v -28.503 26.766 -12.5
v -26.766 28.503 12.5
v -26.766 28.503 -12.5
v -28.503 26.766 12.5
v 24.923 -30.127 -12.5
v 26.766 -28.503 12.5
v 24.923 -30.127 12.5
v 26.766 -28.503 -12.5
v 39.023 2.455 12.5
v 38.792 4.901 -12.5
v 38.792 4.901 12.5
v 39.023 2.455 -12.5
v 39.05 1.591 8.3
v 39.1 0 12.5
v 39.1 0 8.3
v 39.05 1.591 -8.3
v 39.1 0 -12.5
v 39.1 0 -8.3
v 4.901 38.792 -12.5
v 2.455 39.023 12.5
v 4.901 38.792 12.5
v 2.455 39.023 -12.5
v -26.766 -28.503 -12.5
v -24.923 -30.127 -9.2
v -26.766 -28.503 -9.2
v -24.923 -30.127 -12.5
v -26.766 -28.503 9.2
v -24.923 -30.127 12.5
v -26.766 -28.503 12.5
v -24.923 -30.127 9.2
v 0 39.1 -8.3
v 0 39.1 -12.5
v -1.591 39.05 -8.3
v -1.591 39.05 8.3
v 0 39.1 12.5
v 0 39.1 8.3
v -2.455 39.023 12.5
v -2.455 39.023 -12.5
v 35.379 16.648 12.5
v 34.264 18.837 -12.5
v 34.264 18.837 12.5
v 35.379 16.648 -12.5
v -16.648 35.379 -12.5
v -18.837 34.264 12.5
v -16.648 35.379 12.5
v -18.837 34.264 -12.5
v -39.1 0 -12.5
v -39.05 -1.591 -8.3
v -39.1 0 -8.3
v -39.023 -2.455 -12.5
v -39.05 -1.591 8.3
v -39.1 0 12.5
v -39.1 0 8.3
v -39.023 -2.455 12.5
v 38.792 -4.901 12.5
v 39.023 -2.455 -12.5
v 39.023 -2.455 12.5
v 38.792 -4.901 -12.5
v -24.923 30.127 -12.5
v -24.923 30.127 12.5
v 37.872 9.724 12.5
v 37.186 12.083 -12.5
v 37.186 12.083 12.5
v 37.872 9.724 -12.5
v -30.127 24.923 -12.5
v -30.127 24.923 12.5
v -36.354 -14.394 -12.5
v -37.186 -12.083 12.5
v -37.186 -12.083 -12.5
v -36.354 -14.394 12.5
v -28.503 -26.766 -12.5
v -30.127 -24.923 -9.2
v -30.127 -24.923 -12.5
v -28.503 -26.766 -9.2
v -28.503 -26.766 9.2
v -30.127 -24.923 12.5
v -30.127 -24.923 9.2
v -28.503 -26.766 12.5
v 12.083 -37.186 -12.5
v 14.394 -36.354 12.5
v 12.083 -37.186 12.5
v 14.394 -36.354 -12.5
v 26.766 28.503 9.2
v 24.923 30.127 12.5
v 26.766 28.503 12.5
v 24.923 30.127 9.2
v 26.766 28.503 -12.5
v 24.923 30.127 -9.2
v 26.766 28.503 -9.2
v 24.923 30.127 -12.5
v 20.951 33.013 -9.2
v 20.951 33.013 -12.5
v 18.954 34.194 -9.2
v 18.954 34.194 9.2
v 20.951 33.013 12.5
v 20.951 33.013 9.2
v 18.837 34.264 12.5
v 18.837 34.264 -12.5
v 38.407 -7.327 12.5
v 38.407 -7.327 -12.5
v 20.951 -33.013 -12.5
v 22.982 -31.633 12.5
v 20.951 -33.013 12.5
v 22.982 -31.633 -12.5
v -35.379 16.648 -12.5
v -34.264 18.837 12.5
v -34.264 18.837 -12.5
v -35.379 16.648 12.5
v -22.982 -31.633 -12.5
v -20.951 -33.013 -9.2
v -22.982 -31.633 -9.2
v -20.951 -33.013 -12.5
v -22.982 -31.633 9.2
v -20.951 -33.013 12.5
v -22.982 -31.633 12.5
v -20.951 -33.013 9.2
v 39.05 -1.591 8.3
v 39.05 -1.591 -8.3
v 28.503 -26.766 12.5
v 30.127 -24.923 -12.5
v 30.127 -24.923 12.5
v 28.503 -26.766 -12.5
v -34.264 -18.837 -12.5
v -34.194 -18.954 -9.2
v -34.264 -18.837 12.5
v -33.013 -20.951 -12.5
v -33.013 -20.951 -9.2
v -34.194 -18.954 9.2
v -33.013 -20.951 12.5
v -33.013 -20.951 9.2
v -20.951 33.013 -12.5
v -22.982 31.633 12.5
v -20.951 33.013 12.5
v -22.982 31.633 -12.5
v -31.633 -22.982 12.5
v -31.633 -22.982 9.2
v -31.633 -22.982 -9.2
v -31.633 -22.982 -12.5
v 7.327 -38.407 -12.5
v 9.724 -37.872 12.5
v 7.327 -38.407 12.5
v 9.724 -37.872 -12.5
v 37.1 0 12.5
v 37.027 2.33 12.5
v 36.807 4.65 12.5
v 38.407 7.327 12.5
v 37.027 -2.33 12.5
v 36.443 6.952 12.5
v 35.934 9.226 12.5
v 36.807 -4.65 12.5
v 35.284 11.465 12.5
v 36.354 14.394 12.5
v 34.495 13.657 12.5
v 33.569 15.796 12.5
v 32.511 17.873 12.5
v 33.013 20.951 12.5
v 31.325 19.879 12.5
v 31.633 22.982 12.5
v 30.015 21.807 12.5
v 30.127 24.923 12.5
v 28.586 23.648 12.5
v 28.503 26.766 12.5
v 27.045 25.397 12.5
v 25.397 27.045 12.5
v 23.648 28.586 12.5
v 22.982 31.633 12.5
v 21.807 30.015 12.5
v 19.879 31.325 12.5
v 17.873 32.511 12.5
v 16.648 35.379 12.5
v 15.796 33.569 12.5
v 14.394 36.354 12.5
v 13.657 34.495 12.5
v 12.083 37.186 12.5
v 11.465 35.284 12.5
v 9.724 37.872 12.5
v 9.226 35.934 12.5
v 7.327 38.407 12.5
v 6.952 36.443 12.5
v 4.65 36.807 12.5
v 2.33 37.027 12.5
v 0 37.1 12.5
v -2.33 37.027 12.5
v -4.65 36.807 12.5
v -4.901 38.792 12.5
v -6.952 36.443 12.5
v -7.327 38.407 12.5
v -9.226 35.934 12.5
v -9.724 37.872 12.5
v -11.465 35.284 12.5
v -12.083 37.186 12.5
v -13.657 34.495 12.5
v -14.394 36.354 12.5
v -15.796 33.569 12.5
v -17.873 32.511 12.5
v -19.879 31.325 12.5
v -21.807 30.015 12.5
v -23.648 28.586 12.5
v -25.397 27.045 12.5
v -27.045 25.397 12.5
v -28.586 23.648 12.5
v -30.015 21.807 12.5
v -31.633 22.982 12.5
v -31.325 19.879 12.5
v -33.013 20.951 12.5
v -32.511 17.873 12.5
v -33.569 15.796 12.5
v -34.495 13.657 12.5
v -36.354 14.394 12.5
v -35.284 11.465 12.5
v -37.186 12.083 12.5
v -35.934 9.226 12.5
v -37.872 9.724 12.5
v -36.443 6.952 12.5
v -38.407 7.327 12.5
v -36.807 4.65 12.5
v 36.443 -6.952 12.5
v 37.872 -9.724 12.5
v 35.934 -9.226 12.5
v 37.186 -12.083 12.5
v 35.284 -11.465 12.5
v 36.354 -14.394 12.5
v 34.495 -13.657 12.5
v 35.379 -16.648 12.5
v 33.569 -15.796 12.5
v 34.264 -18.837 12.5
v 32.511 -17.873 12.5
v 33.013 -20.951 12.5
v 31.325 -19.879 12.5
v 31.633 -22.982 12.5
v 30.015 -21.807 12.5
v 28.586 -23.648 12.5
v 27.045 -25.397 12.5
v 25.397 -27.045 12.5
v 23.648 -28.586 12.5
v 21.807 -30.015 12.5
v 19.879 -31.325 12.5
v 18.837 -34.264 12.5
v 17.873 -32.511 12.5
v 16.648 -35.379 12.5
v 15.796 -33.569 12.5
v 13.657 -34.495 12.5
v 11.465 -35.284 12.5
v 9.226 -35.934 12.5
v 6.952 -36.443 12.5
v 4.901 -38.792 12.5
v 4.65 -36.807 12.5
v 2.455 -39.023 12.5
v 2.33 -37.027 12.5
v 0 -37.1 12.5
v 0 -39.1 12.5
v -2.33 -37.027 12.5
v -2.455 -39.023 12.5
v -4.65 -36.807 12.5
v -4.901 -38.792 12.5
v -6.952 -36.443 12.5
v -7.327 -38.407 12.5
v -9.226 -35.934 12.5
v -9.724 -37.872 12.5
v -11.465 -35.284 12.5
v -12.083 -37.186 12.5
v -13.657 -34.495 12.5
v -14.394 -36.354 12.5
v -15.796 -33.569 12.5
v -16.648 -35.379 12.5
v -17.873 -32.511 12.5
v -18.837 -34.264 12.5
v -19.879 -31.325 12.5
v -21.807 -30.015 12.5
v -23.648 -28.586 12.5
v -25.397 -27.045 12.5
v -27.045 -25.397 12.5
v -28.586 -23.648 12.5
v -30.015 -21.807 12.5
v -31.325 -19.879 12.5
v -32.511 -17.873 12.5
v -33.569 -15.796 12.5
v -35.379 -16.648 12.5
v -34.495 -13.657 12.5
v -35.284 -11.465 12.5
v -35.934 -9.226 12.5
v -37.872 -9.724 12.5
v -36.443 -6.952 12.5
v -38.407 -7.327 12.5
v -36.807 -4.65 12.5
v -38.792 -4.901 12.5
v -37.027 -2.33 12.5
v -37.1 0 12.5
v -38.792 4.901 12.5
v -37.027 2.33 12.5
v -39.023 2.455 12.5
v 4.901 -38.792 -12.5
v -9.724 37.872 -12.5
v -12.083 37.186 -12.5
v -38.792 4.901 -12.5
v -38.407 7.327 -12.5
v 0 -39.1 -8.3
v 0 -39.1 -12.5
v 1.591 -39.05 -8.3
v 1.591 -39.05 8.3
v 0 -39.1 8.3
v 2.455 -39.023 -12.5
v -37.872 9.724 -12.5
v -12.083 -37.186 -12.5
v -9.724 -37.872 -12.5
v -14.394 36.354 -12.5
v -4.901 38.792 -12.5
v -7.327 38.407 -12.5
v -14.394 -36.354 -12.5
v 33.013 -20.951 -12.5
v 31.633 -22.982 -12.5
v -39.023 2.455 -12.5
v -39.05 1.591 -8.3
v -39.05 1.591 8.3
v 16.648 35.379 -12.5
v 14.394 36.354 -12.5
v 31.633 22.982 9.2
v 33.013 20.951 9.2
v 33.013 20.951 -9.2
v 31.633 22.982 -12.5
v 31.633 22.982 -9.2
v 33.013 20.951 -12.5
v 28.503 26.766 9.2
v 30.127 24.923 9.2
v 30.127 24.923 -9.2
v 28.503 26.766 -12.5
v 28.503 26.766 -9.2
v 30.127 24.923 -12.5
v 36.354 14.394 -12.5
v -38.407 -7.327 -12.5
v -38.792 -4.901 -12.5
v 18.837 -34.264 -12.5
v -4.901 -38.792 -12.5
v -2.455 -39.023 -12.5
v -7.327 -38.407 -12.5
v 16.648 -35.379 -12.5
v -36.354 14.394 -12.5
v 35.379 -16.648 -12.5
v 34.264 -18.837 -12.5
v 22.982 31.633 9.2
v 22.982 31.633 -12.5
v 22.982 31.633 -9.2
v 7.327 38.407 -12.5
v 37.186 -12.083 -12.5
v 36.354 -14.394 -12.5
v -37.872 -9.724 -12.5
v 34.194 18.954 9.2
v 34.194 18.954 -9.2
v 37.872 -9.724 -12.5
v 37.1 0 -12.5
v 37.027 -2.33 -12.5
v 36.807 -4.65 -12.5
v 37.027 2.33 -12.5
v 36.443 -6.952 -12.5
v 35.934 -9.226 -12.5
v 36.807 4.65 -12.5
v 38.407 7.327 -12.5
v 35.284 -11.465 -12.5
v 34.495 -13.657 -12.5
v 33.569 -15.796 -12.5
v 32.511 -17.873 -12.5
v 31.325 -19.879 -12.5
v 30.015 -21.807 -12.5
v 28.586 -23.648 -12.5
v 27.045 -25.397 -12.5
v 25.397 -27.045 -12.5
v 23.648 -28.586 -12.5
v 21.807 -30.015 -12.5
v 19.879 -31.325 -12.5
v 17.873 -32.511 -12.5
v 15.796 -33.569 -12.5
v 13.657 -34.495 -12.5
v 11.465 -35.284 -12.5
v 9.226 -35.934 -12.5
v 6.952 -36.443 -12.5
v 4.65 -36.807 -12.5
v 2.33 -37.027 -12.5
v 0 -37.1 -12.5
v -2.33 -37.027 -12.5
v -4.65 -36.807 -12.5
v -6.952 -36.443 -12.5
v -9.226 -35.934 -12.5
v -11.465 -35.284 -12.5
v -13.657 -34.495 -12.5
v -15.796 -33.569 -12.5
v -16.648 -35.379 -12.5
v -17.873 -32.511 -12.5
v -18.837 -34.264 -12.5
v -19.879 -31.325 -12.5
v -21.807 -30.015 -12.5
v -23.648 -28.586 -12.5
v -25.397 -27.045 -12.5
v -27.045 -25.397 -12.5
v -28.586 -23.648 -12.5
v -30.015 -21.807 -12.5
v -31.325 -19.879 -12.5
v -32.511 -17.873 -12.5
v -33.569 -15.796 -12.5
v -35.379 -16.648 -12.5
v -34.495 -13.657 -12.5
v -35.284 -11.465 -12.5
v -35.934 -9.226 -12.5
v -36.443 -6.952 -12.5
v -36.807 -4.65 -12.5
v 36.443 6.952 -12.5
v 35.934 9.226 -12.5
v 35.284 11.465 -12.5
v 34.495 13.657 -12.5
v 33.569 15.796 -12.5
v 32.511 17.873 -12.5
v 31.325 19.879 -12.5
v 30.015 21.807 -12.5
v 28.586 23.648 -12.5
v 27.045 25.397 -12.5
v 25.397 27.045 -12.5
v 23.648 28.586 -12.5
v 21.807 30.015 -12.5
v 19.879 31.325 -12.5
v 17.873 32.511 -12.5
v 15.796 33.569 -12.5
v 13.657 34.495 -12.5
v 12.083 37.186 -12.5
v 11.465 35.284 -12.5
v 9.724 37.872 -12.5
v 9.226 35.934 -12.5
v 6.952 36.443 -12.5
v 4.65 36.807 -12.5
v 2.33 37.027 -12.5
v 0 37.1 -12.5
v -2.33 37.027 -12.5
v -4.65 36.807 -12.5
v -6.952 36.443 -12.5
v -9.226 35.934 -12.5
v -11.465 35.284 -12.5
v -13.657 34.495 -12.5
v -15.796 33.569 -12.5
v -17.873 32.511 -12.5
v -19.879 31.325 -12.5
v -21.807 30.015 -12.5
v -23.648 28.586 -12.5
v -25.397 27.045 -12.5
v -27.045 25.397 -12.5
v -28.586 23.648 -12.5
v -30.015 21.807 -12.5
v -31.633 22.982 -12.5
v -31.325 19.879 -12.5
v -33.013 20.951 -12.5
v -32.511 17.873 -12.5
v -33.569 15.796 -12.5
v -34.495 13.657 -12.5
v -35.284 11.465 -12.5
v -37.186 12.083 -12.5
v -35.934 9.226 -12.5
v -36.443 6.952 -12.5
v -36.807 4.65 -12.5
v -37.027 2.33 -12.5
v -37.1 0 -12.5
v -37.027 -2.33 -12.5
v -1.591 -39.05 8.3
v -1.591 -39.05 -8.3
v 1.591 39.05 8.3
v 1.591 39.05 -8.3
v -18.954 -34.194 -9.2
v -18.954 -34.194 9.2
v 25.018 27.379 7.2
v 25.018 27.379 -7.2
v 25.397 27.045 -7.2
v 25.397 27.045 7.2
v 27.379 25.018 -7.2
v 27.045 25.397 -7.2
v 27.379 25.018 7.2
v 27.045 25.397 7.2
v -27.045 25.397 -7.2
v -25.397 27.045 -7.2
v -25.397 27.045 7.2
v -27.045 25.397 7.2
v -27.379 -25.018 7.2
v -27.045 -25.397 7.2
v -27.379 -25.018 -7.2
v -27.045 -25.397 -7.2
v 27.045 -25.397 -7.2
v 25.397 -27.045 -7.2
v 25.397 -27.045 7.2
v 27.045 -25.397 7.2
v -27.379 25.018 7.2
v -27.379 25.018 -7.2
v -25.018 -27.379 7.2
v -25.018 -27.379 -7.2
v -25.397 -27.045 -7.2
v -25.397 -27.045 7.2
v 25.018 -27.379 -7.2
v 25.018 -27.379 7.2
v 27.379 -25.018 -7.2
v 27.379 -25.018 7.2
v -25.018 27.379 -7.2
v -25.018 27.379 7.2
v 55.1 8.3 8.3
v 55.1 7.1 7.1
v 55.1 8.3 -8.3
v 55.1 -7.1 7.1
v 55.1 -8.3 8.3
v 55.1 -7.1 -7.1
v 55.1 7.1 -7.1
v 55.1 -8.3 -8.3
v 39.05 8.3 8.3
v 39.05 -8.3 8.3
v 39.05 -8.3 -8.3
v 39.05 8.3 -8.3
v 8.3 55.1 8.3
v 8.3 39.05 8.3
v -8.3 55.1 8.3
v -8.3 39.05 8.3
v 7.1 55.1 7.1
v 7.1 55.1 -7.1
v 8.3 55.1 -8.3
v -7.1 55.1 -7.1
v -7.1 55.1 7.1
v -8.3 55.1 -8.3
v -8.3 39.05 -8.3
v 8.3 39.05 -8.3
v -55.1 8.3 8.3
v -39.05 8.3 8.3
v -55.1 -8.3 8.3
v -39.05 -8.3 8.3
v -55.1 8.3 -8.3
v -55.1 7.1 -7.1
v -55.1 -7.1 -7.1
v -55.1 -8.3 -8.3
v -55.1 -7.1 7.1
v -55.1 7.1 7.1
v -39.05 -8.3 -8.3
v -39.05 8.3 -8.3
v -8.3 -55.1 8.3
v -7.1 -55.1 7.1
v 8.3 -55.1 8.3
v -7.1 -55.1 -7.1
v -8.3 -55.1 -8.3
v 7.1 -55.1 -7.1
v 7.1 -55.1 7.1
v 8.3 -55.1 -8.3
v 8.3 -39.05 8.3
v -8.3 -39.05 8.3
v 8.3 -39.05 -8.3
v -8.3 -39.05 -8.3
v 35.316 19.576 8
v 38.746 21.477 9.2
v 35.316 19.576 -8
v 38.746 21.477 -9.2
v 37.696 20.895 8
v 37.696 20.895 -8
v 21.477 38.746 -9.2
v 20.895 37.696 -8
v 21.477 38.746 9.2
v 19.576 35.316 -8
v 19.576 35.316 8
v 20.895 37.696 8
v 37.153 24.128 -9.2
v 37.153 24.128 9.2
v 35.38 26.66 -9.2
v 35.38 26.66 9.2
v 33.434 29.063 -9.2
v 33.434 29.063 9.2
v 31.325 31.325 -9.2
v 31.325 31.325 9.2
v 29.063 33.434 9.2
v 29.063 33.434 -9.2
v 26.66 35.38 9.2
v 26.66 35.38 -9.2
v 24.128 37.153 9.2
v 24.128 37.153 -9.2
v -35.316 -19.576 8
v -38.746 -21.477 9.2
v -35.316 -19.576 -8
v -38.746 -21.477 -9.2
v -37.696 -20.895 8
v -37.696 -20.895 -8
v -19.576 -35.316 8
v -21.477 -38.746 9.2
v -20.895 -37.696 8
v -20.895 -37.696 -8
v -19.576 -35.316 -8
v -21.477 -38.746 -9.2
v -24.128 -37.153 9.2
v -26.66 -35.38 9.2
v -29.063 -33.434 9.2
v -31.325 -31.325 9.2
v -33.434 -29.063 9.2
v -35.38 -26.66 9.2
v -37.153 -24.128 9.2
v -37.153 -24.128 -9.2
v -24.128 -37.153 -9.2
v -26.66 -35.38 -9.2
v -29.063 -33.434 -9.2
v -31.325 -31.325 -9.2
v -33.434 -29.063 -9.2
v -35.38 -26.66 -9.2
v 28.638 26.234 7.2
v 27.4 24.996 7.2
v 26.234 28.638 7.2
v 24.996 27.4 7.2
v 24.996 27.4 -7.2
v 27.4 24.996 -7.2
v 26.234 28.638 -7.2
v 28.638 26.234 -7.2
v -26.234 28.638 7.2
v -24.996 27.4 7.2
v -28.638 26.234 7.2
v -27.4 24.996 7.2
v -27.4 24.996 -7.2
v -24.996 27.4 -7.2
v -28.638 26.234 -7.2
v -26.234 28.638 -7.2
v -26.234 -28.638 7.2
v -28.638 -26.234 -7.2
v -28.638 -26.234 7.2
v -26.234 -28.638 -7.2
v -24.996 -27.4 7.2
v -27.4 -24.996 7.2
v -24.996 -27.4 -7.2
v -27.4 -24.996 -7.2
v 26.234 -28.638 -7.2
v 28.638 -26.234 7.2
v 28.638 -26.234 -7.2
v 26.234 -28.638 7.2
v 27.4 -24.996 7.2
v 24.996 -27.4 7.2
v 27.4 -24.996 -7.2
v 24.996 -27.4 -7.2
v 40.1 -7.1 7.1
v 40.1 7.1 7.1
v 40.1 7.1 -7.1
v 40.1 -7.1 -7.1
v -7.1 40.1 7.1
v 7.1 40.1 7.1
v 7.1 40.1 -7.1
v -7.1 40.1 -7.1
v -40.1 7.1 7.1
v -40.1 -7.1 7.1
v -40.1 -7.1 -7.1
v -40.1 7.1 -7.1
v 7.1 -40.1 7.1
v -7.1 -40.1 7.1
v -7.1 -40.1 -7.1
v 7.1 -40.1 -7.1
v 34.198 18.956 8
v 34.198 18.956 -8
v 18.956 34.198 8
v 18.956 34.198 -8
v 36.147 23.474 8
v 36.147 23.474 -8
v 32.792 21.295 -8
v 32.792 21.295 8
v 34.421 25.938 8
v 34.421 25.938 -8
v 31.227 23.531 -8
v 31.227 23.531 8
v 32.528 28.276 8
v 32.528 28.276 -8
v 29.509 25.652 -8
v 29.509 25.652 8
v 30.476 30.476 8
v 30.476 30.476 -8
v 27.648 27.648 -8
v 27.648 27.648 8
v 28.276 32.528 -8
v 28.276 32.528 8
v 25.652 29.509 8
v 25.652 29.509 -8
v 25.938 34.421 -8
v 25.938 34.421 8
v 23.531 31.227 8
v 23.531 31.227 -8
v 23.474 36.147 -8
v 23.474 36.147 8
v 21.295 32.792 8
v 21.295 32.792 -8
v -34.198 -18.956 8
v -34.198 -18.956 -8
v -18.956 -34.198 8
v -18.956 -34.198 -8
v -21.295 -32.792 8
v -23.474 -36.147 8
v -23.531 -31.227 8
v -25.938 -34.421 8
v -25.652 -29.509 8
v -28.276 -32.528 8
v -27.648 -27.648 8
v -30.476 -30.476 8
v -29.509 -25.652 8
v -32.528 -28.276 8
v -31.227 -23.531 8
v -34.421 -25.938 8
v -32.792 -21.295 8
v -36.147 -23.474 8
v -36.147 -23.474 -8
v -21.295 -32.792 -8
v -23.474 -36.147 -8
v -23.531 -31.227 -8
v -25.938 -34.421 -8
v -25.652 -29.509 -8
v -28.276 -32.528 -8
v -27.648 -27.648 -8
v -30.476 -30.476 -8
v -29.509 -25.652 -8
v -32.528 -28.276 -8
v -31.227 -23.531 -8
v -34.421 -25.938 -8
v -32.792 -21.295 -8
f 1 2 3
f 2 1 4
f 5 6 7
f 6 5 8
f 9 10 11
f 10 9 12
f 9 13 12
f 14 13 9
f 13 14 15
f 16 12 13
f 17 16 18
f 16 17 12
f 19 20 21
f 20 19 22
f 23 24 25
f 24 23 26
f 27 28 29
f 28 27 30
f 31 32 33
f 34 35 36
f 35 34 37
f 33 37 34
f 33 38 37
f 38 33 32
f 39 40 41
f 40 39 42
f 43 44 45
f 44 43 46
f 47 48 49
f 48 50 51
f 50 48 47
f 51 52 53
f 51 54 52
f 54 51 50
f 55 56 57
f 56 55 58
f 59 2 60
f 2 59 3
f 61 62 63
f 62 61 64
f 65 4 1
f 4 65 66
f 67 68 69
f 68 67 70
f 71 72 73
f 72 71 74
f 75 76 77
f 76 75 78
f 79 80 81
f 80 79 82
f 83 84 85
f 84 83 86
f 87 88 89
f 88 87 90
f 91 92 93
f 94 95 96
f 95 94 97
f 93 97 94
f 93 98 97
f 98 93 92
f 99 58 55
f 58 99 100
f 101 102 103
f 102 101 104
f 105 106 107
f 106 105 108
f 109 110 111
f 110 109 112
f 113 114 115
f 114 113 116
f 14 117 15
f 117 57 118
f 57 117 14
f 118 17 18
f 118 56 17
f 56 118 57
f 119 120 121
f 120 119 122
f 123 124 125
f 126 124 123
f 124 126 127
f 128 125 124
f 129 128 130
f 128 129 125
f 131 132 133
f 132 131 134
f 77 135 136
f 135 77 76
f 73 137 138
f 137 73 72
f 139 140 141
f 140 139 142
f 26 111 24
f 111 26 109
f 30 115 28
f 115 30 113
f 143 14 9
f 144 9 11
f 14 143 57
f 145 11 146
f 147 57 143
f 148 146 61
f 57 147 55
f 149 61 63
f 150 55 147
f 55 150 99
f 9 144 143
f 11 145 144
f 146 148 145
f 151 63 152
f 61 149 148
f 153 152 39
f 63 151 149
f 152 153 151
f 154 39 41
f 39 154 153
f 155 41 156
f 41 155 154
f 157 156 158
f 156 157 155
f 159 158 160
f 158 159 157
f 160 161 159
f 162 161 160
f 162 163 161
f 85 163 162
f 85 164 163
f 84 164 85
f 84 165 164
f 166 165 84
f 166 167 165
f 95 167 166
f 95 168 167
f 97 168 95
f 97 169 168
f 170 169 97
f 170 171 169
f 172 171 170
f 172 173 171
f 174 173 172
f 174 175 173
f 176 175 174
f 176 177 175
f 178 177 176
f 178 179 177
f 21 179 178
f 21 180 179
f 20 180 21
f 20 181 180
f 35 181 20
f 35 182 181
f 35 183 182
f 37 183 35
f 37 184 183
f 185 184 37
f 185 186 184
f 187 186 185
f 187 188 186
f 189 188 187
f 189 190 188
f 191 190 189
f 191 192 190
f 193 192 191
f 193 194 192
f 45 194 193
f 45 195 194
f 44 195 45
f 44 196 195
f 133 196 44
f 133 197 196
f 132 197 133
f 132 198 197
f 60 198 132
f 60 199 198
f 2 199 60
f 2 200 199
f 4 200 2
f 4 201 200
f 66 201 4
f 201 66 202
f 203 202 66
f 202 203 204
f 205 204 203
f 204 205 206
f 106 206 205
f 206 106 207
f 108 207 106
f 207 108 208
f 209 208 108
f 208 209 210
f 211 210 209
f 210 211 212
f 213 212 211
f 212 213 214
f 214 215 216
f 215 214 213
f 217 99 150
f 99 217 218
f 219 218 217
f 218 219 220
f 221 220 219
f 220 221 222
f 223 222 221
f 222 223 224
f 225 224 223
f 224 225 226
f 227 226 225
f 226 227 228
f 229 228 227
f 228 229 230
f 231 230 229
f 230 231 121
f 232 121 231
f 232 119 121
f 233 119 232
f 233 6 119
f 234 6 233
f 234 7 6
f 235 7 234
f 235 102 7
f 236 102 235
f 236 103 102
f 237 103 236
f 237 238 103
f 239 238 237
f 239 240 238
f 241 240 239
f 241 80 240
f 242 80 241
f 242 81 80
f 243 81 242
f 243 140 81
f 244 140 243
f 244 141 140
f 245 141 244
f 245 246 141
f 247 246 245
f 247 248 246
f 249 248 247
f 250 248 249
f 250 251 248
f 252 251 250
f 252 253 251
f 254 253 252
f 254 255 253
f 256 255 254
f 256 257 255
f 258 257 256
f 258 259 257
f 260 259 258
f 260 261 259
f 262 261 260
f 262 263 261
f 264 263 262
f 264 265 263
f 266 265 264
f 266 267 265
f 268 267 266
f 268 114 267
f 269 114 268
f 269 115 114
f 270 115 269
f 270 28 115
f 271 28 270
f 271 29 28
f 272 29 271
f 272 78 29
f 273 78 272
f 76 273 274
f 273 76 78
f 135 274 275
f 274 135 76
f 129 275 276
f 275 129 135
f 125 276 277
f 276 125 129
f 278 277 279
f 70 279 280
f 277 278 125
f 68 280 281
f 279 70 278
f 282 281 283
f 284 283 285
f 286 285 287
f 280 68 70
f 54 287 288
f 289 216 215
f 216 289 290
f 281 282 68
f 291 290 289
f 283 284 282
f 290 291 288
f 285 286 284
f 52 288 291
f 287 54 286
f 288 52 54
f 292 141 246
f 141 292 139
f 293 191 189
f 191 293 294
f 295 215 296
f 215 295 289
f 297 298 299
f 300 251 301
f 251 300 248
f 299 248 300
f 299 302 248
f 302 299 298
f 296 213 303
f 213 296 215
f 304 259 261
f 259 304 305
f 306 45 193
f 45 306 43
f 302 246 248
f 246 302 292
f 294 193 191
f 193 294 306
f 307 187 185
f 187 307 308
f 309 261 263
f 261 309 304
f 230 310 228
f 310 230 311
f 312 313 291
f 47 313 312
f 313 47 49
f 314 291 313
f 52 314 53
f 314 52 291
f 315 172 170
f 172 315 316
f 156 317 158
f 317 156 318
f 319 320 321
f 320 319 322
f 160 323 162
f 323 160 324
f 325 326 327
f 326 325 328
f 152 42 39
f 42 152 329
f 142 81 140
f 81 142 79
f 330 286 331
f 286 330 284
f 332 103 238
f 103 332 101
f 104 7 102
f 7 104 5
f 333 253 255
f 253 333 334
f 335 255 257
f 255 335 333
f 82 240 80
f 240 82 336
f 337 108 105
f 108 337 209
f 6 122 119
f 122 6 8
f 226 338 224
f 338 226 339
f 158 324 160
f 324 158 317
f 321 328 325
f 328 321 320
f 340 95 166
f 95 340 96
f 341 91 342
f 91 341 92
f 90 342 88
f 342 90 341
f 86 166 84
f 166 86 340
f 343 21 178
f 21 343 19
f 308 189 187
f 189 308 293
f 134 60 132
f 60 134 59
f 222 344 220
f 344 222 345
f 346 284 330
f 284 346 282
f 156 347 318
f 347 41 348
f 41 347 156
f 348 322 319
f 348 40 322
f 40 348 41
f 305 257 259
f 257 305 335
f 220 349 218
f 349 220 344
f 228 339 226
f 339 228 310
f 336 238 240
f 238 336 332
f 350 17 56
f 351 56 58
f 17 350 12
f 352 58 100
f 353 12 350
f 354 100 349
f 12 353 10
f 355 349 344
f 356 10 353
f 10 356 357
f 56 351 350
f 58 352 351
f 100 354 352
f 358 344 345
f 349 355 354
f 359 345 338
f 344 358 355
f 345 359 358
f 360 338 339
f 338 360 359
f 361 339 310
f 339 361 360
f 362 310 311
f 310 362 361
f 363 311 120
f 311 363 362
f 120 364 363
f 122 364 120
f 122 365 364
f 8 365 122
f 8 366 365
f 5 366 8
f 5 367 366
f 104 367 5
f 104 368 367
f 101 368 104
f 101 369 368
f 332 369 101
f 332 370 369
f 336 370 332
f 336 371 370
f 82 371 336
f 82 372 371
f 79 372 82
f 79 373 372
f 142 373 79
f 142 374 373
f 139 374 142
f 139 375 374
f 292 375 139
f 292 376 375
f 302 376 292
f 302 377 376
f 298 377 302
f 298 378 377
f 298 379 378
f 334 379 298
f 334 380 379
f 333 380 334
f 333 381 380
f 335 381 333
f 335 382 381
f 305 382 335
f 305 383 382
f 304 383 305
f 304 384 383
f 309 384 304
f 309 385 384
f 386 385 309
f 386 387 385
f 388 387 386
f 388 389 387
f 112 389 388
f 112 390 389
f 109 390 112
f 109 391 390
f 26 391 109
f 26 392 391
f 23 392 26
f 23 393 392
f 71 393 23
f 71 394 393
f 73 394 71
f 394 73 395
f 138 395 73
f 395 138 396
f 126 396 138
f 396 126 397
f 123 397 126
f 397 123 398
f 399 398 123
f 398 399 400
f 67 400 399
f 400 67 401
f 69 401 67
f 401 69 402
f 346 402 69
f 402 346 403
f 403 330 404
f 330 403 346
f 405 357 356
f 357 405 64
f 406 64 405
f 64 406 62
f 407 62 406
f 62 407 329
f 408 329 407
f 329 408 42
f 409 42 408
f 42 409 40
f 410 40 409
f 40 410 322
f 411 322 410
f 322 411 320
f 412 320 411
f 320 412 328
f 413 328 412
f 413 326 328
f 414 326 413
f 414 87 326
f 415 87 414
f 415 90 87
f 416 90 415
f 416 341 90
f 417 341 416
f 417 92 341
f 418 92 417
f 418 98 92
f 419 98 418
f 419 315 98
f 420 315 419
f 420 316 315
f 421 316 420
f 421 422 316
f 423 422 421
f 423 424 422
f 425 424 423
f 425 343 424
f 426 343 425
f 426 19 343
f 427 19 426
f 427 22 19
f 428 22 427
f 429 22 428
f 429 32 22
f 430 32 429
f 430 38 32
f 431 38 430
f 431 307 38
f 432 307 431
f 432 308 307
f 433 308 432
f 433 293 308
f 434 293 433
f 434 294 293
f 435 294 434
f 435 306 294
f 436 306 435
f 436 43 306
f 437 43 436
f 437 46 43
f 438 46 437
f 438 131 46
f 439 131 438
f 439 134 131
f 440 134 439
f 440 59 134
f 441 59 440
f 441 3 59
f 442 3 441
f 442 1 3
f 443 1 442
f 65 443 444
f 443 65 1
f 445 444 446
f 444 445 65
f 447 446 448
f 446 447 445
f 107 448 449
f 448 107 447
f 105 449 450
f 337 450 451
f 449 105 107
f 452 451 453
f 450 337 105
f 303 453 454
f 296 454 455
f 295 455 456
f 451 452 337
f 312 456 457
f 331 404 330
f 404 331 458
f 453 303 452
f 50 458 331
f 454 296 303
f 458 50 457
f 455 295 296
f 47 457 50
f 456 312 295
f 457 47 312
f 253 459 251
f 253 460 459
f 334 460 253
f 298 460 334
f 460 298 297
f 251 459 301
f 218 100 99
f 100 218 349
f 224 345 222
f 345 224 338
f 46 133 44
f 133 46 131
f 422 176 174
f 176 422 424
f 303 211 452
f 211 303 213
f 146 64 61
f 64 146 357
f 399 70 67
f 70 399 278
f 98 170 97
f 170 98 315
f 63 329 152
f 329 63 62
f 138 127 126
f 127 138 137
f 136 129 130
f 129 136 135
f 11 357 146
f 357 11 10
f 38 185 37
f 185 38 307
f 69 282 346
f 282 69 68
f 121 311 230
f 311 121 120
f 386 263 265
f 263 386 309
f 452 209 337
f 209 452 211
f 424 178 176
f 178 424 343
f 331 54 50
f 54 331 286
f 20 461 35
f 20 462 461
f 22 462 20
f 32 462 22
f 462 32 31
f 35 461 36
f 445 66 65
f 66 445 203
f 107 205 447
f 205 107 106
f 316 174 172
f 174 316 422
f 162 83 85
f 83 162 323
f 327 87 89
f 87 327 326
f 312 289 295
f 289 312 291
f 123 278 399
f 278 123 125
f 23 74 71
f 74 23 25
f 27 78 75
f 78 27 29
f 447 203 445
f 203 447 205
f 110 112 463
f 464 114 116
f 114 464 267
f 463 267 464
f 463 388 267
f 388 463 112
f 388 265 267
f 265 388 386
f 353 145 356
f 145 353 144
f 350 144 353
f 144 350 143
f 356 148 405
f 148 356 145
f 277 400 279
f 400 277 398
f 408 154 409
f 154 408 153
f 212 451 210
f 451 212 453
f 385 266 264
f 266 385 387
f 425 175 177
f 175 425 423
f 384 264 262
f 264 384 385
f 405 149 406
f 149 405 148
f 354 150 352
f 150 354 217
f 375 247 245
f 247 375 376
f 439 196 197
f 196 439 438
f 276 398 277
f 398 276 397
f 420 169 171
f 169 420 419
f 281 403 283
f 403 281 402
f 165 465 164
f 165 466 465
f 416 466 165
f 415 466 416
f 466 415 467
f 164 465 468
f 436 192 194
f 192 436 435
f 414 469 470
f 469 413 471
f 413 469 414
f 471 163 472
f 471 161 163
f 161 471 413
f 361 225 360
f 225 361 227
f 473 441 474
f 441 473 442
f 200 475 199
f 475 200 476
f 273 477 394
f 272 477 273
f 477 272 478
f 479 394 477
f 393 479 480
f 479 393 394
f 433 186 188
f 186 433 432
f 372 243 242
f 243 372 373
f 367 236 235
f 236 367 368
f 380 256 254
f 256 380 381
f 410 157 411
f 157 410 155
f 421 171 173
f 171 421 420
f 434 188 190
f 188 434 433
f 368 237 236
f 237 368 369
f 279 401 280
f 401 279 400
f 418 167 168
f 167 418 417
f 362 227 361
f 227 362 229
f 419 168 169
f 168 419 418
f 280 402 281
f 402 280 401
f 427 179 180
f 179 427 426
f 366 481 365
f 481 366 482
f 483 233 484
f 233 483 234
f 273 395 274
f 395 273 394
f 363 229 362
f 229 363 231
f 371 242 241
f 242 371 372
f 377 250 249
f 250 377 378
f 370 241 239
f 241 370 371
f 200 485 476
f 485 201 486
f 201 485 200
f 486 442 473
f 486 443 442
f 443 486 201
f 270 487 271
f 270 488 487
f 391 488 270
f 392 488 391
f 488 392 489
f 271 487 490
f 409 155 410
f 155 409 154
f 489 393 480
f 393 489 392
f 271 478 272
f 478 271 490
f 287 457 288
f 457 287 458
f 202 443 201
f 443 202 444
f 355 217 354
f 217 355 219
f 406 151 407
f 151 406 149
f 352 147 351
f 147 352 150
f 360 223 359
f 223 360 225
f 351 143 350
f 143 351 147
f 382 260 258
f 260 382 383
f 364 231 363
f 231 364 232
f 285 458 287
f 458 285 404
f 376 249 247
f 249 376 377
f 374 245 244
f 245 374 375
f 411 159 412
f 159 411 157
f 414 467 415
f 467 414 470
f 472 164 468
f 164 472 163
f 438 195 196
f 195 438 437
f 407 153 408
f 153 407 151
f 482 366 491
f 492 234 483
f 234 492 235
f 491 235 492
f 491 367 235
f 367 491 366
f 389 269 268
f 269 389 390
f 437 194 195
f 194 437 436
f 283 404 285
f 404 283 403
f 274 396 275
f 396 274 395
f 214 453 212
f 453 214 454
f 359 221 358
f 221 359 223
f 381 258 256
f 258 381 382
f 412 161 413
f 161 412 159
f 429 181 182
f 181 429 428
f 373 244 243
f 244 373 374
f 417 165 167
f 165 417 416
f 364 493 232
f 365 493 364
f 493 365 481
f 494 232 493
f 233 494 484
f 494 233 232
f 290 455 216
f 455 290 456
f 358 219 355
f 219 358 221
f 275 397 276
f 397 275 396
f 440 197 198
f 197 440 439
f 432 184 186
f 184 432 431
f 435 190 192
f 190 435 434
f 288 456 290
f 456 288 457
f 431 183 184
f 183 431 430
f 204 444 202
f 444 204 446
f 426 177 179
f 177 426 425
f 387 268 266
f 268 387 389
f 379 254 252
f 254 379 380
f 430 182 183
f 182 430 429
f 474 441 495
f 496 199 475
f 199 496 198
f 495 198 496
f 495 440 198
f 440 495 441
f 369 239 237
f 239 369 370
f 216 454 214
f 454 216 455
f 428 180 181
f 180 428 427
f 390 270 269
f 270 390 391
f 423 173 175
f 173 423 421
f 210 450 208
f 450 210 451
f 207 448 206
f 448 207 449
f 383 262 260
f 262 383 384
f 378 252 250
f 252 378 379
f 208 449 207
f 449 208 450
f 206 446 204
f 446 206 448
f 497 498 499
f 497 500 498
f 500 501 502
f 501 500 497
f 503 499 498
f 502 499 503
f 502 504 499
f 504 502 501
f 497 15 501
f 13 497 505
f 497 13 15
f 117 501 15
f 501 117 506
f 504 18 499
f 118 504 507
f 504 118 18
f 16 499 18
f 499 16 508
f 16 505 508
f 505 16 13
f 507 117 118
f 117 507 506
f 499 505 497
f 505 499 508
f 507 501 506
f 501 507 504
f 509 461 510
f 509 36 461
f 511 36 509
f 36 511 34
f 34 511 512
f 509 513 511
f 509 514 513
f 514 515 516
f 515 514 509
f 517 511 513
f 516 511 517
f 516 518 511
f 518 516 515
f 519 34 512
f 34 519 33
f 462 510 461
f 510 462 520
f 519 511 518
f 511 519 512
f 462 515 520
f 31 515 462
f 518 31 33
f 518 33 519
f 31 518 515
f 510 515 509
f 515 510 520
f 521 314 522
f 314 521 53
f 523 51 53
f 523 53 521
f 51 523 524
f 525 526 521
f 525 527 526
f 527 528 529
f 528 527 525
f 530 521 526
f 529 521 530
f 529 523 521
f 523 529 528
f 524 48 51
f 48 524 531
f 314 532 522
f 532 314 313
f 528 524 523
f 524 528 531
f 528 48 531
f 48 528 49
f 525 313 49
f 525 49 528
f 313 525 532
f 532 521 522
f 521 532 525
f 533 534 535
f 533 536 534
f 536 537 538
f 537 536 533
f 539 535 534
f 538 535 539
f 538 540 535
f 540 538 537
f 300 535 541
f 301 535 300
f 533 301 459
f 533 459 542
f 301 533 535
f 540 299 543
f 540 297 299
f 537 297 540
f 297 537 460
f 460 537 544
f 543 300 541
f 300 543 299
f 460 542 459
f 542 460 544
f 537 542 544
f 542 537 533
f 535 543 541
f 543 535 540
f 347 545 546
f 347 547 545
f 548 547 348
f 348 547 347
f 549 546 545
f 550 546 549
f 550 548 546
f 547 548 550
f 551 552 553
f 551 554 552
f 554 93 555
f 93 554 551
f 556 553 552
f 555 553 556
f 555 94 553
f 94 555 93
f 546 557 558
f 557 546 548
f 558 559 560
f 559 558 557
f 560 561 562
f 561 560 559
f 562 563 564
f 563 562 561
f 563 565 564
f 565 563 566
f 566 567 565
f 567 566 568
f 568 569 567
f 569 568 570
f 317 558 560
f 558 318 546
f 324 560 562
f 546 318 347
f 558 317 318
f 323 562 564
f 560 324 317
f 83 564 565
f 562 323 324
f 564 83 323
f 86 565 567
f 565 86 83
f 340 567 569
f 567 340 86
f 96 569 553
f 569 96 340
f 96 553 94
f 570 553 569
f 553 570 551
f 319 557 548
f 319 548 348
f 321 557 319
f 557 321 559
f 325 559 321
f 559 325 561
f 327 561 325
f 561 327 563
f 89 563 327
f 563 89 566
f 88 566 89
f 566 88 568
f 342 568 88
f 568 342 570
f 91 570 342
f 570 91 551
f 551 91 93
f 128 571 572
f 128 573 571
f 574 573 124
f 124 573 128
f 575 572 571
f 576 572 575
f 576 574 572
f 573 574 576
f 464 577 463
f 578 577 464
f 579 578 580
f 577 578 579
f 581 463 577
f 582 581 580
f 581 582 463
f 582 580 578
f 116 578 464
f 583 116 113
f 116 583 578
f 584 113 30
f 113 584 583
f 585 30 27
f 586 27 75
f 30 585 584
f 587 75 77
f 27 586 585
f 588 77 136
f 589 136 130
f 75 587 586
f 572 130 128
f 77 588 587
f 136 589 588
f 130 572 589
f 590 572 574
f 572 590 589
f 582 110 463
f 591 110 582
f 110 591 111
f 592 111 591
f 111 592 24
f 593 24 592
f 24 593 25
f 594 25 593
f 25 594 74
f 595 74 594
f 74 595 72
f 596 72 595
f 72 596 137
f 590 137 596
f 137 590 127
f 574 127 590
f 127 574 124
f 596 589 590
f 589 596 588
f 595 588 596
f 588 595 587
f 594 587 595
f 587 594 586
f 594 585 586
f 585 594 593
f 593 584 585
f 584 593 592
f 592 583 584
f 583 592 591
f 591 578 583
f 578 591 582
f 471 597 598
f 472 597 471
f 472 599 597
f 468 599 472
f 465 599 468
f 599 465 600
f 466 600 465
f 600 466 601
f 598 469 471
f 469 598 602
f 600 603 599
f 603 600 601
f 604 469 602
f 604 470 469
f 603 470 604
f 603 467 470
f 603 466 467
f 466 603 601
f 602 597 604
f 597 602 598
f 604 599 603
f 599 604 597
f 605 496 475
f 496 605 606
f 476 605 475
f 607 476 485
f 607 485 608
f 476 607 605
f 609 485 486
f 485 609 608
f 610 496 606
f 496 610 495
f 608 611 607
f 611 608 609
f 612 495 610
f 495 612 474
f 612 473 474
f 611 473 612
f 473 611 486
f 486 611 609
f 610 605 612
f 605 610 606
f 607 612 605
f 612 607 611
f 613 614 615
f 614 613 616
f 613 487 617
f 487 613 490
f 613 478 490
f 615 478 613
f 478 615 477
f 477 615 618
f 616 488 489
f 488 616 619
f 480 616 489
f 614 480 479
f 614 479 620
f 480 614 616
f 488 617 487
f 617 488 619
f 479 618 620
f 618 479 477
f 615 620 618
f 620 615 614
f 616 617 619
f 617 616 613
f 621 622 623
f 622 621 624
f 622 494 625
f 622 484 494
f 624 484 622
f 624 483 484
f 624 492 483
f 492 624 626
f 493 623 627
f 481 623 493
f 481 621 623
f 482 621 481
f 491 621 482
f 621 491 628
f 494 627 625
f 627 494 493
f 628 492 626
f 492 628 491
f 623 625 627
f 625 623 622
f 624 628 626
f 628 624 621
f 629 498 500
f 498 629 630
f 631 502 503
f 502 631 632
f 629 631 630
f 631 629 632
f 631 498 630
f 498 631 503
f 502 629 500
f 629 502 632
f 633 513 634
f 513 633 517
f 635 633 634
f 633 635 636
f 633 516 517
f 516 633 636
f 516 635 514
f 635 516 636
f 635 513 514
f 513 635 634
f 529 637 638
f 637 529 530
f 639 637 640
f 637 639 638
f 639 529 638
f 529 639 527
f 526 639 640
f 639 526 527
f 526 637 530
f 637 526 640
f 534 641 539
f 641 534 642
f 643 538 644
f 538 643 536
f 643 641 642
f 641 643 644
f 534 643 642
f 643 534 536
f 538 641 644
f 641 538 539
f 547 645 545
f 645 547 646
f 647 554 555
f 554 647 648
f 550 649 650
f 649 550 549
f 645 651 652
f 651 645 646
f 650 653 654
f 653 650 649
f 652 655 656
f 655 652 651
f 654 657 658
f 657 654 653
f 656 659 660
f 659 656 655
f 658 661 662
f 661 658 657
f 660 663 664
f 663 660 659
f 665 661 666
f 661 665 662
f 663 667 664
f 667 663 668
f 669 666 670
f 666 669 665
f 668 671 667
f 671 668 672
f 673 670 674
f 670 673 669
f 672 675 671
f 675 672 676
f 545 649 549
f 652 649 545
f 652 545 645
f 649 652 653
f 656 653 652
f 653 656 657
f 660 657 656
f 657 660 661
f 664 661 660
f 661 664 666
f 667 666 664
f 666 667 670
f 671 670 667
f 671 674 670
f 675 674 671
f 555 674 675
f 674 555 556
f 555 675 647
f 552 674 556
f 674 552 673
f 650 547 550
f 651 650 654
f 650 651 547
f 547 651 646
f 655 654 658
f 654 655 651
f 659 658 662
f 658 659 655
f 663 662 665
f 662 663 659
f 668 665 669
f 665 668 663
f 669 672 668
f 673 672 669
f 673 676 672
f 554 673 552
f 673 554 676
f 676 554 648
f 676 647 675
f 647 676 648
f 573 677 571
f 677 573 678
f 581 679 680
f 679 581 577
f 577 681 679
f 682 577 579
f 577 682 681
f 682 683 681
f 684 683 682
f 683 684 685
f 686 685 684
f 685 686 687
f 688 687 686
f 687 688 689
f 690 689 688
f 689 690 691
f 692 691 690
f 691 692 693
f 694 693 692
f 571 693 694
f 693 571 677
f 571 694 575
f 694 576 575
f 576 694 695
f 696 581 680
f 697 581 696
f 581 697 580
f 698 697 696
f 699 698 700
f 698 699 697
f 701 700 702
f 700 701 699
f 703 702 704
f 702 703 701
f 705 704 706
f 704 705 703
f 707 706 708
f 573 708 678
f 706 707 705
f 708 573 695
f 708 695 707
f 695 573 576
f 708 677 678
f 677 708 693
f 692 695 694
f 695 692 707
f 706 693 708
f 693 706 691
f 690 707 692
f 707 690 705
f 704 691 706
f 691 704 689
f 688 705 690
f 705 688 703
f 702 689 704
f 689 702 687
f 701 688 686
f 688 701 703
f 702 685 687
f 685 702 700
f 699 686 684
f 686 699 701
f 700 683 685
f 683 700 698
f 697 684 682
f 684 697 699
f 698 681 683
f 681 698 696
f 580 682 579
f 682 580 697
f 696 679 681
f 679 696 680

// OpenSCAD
/*
FILE 2 - ELECTRONICS AND CAMERA COLLAR

Global origin: (0,0,0)

File 1 core OD: 74.0 mm
Collar ID: 74.2 mm
Diametral clearance: 0.2 mm

Height: 25 mm
Z range: -12.5 to +12.5 mm

Camera stations:
0, 90, 180, 270 degrees

Camera cavity:
14.2 x 14.2 x 15 mm

Female keyways:
45, 135, 225, 315 degrees
*/

$fn = 100;


// ============================================================
// BASIC DIMENSIONS
// ============================================================

core_od = 74;
collar_id = 74.2;

collar_inner_radius = collar_id / 2;

collar_wall = 2;

collar_outer_radius =
    collar_inner_radius + collar_wall;

collar_height = 25;


// ============================================================
// CAMERA DIMENSIONS
// ============================================================

camera_count = 4;

camera_width = 14.2;
camera_height = 14.2;
camera_depth = 15;

camera_wall = 1.2;
camera_back_wall = 1.0;


// Housing dimensions

camera_outer_width =
    camera_width + 2 * camera_wall;

camera_outer_height =
    camera_height + 2 * camera_wall;

camera_outer_depth =
    camera_depth + camera_back_wall;


// ============================================================
// FILE 1 KEY DIMENSIONS
// ============================================================

key_count = 4;

key_angle_offset = 45;

file1_key_width = 3;
file1_key_projection = 1.5;
file1_key_height = 14;


// Female keyway clearance

key_clearance = 0.2;

keyway_width =
    file1_key_width + 2 * key_clearance;

keyway_depth =
    file1_key_projection + key_clearance;

keyway_height =
    file1_key_height + 2 * key_clearance;


// ============================================================
// BATTERY SUPPORTS
// ============================================================

battery_angle_1 = 45;
battery_angle_2 = 225;

battery_arc_angle = 32;

battery_depth = 4;

battery_height = 16;

battery_wall = 1.2;


// ============================================================
// BOOLEAN TOLERANCE
// ============================================================

eps = 0.05;


// ============================================================
// MAIN MODEL
// ============================================================

electronics_camera_collar();


// ============================================================
// COMPLETE COLLAR
// ============================================================

module electronics_camera_collar()
{
    difference()
    {
        union()
        {
            collar_ring();

            camera_housings();

            battery_supports();
        }

        female_keyways();

        camera_pockets();

        battery_cavities();
    }
}


// ============================================================
// MAIN COLLAR
// ============================================================

module collar_ring()
{
    difference()
    {
        cylinder(
            h = collar_height,
            r = collar_outer_radius,
            center = true
        );

        cylinder(
            h = collar_height + 0.2,
            r = collar_inner_radius,
            center = true
        );
    }
}


// ============================================================
// CAMERA HOUSINGS
// ============================================================

module camera_housings()
{
    for (i = [0 : camera_count - 1])
    {
        angle =
            i * 360 / camera_count;

        rotate([0,0,angle])

        translate([
            collar_outer_radius - eps,
            -camera_outer_width / 2,
            -camera_outer_height / 2
        ])

        cube([
            camera_outer_depth + eps,
            camera_outer_width,
            camera_outer_height
        ]);
    }
}


// ============================================================
// CAMERA POCKETS
// ============================================================

module camera_pockets()
{
    for (i = [0 : camera_count - 1])
    {
        angle =
            i * 360 / camera_count;

        rotate([0,0,angle])

        translate([
            collar_outer_radius +
            camera_back_wall,

            -camera_width / 2,

            -camera_height / 2
        ])

        cube([
            camera_depth + eps,
            camera_width,
            camera_height
        ]);
    }
}


// ============================================================
// FEMALE KEYWAYS
// ============================================================

module female_keyways()
{
    for (i = [0 : key_count - 1])
    {
        angle =
            key_angle_offset +
            i * 360 / key_count;

        rotate([0,0,angle])

        translate([
            collar_inner_radius - eps,
            -keyway_width / 2,
            -keyway_height / 2
        ])

        cube([
            keyway_depth + eps,
            keyway_width,
            keyway_height
        ]);
    }
}


// ============================================================
// BATTERY SUPPORTS
// ============================================================

module battery_supports()
{
    battery_support(battery_angle_1);

    battery_support(battery_angle_2);
}


module battery_support(angle_position)
{
    rotate([
        0,
        0,
        angle_position -
        battery_arc_angle / 2
    ])

    rotate_extrude(
        angle = battery_arc_angle
    )

    translate([
        collar_outer_radius - eps,
        -battery_height / 2 -
        battery_wall
    ])

    square([
        battery_depth +
        battery_wall +
        eps,

        battery_height +
        2 * battery_wall
    ]);
}


// ============================================================
// BATTERY CAVITIES
// ============================================================

module battery_cavities()
{
    battery_cavity(battery_angle_1);

    battery_cavity(battery_angle_2);
}


module battery_cavity(angle_position)
{
    rotate([
        0,
        0,
        angle_position -
        battery_arc_angle / 2
    ])

    rotate_extrude(
        angle = battery_arc_angle
    )

    translate([
        collar_outer_radius,
        -battery_height / 2
    ])

    square([
        battery_depth,
        battery_height
    ]);
}


// ============================================================
// OUTPUT
// ============================================================

echo("FILE 2 - ELECTRONICS CAMERA COLLAR");

echo(
    "Collar ID =",
    collar_id
);

echo(
    "Collar OD =",
    collar_outer_radius * 2
);

echo(
    "Height =",
    collar_height
);

echo(
    "Core/collar diametral clearance =",
    collar_id - core_od
);

echo(
    "Camera pocket width =",
    camera_width
);

echo(
    "Camera pocket height =",
    camera_height
);

echo(
    "Camera pocket depth =",
    camera_depth
);
